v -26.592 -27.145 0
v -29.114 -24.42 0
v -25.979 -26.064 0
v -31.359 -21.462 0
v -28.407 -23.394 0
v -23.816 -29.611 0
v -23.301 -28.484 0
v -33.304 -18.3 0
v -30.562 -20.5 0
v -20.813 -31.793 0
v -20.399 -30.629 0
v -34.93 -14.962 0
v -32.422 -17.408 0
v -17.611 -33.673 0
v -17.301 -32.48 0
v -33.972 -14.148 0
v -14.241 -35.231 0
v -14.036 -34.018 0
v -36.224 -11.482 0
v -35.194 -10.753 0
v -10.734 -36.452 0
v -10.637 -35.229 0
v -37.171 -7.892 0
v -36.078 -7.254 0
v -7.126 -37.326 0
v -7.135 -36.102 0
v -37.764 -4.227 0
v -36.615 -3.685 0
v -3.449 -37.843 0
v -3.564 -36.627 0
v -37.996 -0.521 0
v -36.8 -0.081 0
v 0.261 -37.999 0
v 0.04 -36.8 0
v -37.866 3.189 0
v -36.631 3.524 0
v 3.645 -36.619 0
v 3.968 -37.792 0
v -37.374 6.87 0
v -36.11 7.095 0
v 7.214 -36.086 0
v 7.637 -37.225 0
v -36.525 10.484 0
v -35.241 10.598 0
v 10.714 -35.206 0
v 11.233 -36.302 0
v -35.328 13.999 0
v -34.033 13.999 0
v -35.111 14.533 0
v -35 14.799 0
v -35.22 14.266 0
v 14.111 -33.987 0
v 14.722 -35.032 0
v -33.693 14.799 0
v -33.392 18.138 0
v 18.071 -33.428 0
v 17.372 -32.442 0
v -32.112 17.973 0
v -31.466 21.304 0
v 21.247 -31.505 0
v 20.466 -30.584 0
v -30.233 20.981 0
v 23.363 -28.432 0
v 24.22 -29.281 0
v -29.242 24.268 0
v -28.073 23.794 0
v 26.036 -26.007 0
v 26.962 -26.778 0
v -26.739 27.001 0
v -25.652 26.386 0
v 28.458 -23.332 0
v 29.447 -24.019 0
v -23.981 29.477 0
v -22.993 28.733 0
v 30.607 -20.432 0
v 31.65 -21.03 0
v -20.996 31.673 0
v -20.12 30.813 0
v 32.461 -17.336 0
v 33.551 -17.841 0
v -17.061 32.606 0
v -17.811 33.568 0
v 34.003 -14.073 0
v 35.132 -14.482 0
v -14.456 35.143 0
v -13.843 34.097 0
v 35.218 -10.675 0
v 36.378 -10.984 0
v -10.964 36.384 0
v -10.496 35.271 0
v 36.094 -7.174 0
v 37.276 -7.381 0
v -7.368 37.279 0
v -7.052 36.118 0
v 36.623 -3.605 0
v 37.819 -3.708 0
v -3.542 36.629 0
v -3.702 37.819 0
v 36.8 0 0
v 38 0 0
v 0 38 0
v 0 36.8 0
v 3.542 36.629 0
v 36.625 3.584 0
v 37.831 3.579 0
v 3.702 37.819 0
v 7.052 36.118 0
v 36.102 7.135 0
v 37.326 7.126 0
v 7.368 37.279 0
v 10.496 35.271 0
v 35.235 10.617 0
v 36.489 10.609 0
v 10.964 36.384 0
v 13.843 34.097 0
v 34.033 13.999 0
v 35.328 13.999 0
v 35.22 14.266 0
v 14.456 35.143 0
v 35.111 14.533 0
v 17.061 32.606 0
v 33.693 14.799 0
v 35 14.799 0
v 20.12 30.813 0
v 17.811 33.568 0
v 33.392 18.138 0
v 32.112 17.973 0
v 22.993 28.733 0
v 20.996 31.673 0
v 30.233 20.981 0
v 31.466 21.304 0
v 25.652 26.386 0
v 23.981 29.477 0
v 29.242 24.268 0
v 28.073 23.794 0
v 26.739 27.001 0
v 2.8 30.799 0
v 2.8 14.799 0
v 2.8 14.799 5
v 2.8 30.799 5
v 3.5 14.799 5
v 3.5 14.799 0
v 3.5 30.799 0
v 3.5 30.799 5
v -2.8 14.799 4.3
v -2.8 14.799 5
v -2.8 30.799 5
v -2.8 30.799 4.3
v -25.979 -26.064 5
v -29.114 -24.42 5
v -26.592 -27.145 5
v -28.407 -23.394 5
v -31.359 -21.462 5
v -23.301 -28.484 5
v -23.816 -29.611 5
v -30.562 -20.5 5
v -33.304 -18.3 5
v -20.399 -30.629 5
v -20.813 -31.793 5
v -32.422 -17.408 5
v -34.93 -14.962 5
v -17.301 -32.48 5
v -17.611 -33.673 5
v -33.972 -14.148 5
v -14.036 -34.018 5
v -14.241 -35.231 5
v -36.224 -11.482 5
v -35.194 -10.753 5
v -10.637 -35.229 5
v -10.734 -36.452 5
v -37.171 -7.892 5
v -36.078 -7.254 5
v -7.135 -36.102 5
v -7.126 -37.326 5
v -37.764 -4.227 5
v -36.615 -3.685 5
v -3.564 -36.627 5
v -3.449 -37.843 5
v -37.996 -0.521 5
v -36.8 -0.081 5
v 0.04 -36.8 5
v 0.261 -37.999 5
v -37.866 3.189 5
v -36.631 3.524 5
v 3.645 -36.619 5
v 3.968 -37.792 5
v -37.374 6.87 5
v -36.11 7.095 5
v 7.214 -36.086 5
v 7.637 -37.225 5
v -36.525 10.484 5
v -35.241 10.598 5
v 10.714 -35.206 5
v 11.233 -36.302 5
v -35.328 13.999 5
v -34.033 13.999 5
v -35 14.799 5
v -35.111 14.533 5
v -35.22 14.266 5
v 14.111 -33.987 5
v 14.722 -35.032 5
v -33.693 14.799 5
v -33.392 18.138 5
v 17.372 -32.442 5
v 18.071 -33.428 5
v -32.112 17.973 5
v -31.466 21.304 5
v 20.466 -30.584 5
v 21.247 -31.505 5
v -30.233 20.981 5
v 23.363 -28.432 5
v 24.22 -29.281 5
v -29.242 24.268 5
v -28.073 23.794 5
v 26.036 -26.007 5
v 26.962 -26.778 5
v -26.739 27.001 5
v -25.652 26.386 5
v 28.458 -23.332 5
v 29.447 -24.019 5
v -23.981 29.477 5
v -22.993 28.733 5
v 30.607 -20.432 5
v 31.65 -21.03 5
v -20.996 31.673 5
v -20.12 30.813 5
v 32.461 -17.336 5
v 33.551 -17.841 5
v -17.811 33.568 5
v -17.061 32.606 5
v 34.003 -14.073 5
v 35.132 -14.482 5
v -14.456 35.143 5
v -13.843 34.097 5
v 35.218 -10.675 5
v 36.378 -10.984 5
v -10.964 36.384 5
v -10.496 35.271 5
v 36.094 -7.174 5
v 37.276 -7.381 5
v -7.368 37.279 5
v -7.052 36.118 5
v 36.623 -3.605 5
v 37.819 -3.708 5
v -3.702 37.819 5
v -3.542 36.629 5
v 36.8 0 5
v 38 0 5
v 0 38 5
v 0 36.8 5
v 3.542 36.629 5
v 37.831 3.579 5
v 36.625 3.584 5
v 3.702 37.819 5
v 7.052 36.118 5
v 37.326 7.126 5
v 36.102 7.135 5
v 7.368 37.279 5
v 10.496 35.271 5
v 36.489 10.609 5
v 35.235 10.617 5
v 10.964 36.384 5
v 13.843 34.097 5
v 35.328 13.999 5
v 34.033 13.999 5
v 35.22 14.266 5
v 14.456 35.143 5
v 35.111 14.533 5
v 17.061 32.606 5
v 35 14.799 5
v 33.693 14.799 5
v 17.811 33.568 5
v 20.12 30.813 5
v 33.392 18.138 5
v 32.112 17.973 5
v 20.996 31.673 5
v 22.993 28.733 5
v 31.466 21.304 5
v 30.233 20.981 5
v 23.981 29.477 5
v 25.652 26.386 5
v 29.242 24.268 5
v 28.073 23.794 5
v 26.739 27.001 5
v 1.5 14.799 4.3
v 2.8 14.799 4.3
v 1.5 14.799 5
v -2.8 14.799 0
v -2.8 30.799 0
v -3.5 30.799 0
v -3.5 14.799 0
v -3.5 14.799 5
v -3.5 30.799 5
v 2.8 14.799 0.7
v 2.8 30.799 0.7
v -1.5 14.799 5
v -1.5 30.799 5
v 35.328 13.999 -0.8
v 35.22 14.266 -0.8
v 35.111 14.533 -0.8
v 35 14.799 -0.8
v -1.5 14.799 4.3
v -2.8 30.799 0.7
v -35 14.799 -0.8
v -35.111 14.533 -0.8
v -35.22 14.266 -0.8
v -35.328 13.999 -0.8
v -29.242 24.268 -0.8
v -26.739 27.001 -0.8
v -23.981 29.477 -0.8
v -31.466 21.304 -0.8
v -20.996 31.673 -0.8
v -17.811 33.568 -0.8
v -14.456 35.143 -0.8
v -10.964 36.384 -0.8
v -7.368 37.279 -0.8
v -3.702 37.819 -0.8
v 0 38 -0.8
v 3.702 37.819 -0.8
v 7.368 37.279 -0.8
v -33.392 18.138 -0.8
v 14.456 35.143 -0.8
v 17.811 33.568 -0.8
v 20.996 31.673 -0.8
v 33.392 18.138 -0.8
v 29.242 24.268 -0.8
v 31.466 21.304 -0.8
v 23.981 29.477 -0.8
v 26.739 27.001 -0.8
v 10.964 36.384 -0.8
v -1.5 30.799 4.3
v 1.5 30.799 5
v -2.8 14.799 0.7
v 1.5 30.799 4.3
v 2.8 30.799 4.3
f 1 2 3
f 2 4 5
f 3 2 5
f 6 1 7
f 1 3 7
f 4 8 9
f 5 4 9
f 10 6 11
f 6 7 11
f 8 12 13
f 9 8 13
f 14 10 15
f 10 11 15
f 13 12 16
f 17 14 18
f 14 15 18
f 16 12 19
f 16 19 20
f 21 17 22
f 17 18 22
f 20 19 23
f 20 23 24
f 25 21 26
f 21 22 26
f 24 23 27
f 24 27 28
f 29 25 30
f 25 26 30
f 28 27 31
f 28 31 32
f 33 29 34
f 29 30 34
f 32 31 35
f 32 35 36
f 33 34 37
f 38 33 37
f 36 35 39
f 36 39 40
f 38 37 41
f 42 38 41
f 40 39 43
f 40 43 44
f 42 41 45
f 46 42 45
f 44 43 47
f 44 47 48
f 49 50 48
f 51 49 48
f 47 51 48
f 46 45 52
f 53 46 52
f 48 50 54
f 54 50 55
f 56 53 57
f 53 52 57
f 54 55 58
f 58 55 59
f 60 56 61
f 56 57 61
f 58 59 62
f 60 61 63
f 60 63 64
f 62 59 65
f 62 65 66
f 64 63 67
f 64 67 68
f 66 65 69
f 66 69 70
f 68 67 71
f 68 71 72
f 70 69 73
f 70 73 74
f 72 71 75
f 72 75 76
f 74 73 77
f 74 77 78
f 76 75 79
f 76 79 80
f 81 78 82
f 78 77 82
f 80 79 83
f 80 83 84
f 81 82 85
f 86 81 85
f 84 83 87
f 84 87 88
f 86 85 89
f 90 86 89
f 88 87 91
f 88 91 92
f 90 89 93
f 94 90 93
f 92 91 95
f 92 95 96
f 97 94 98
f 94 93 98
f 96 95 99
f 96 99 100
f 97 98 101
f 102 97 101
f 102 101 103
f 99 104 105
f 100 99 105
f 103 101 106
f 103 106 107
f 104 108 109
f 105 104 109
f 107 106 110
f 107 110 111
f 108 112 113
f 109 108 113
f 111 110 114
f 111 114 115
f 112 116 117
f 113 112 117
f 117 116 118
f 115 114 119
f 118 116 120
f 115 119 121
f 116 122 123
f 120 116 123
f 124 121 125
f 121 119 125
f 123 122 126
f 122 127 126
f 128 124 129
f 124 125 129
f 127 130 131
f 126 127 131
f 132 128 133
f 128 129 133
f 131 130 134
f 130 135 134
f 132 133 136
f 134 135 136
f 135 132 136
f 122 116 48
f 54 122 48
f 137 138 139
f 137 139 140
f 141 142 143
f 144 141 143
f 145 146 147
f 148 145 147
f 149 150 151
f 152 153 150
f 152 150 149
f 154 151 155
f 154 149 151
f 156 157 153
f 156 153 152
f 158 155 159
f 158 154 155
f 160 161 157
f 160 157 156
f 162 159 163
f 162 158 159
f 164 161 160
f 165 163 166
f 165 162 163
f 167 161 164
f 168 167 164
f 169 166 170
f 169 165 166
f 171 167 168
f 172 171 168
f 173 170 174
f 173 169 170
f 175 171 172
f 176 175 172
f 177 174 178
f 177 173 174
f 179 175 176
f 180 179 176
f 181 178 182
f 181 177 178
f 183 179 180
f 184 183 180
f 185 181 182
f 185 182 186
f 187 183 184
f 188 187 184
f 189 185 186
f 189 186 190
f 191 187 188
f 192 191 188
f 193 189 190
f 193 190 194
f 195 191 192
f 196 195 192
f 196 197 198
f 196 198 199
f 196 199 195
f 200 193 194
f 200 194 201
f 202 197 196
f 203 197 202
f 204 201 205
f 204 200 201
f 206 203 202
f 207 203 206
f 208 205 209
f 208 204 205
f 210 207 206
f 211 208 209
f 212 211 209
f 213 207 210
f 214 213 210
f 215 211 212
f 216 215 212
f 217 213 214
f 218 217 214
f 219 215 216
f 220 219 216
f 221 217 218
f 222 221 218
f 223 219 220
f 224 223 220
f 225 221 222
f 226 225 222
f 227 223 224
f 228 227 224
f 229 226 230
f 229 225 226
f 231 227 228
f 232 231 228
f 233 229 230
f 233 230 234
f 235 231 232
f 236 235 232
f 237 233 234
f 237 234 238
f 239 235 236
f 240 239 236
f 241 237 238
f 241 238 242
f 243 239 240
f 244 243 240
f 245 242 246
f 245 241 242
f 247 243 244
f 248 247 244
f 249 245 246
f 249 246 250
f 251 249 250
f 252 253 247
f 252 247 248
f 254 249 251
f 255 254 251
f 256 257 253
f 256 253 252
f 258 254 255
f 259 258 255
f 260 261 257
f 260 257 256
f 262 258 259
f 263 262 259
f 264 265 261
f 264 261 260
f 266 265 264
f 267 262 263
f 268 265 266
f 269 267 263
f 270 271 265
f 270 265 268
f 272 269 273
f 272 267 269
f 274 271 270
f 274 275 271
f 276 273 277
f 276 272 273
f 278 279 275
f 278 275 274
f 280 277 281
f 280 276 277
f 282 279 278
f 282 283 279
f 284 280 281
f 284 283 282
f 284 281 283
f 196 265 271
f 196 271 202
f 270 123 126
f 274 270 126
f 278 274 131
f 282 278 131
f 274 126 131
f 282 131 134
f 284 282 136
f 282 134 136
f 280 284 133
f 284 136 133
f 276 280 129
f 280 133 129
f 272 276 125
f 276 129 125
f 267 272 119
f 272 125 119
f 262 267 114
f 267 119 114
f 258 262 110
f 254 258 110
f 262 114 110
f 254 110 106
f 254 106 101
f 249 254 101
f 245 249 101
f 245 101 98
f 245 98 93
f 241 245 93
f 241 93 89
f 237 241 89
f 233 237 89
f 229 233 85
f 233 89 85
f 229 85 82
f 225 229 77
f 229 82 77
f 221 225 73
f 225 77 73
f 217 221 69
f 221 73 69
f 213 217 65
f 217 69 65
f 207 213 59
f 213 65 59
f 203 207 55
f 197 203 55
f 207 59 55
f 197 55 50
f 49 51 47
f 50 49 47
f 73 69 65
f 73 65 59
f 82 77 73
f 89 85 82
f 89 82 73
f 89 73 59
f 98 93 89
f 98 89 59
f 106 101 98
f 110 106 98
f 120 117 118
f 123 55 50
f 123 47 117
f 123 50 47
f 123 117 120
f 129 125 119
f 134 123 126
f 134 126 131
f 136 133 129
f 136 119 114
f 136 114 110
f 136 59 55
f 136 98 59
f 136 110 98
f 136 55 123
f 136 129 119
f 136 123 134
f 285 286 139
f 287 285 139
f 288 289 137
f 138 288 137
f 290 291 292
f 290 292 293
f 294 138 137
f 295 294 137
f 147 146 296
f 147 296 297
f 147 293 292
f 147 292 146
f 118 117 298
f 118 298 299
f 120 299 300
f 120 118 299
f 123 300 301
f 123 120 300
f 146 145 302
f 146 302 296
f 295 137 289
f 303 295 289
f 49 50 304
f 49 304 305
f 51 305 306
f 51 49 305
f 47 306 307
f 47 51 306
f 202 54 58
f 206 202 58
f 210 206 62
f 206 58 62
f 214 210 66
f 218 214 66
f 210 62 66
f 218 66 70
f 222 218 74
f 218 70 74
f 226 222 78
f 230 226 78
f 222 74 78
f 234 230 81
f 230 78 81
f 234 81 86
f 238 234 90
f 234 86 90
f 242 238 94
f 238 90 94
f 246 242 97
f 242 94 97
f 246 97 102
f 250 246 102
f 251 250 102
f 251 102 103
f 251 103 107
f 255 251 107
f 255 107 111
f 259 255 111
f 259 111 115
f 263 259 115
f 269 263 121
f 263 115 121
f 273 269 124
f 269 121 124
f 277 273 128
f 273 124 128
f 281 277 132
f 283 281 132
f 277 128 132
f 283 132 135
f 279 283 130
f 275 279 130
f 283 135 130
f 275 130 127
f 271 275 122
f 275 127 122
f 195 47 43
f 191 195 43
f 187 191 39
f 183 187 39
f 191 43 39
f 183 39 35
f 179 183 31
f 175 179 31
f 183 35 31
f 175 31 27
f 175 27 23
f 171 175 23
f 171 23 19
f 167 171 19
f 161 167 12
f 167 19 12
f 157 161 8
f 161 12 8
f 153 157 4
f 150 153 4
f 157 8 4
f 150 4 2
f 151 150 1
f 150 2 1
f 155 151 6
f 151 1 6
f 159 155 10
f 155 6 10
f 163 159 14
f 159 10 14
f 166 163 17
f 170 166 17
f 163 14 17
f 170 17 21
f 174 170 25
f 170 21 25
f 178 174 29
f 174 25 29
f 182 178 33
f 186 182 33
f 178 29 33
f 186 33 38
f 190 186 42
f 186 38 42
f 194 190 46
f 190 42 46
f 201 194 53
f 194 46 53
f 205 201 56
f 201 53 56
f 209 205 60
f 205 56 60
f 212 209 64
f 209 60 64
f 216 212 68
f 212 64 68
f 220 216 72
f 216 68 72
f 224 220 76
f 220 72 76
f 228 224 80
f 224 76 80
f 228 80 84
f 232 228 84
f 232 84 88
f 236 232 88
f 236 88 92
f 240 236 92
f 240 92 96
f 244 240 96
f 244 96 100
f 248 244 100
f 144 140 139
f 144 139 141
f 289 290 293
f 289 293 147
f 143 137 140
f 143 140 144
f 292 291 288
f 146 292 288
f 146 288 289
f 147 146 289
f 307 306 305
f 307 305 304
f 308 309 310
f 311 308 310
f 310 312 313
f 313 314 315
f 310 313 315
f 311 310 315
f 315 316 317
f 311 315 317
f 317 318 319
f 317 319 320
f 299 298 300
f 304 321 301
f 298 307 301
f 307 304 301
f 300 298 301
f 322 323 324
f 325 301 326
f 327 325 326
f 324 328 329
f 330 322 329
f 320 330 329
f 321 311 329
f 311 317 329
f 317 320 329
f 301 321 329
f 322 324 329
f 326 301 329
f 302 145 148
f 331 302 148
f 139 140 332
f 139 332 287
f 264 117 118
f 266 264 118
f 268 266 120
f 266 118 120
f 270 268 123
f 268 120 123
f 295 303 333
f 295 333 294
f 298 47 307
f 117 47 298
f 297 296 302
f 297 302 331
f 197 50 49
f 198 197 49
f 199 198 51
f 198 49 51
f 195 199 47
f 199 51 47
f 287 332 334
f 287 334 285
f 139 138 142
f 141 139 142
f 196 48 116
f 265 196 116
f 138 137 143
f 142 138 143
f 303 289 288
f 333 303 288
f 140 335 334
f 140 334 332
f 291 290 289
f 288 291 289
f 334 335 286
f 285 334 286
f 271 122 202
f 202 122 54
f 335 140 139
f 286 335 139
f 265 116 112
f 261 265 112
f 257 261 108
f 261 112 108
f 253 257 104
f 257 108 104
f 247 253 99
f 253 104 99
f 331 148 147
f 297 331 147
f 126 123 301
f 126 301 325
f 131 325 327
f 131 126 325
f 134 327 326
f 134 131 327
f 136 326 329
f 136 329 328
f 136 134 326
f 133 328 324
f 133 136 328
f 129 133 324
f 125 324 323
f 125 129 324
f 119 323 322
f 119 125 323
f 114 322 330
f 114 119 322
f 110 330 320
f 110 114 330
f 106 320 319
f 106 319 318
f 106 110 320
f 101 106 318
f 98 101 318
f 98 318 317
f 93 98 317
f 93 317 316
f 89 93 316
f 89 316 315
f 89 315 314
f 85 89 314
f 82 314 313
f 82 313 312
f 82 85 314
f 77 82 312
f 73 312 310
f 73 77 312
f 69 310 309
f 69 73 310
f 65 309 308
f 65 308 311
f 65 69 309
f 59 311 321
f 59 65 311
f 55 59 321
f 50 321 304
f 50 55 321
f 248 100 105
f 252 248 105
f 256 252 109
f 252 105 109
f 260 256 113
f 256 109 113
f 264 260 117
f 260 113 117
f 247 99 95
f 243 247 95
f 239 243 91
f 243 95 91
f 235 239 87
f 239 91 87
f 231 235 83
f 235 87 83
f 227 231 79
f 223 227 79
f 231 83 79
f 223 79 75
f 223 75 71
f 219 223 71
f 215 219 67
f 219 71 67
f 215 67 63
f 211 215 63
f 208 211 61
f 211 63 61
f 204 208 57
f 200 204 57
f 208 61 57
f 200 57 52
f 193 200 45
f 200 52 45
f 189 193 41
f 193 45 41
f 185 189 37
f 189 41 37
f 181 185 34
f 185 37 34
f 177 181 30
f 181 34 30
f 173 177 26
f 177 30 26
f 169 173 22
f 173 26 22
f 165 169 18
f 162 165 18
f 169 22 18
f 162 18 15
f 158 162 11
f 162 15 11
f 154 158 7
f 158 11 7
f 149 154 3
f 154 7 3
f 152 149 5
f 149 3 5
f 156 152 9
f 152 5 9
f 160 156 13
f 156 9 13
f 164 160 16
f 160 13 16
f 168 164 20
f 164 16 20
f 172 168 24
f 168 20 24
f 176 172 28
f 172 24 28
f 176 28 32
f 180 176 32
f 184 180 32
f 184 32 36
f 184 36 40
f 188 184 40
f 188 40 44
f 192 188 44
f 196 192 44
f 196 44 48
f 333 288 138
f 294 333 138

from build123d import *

# Parameters (mm, degrees)
F1_DEPTH = 5
F0_W     = 0.7
F0_H     = 16
F2_DEPTH = 0.8
F3_DEPTH = 0.7
F4_DEPTH = 5
F5_W     = 16
F5_H     = 0.7
F7_DEPTH = 1.3
F6_W     = 16
F6_H     = 0.7
F8_DEPTH = 1.3


with BuildPart() as f1:
    # F0 (on Top) → F1 (new body)
    with BuildSketch(Plane.XY):
        with BuildLine():
            ThreePointArc((33.6933227806, 14.7986485869), (33.8657643047, 14.3996530533), (34.0334811287, 13.9986485869))
            Line((34.0334811287, 13.9986485869), (34.608, 13.9986485869))
            Line((34.608, 13.9986485869), (35.3275789963, 13.9986485869))
            ThreePointArc((35.3275789963, 13.9986485869), (35.1660644922, 14.3995801373), (35, 14.7986485869))
            Line((35, 14.7986485869), (33.6933227806, 14.7986485869))
        make_face()
        with BuildLine():
            ThreePointArc((-33.6933227806, 14.7986485869), (0, 36.8), (33.6933227806, 14.7986485869))
            Line((33.6933227806, 14.7986485869), (35, 14.7986485869))
            ThreePointArc((35, 14.7986485869), (0, 38), (-35, 14.7986485869))
            Line((-35, 14.7986485869), (-33.6933227806, 14.7986485869))
        make_face()
        with BuildLine():
            Line((-34.608, 13.9986485869), (-34.0334811287, 13.9986485869))
            ThreePointArc((-34.0334811287, 13.9986485869), (-33.8657643047, 14.3996530533), (-33.6933227806, 14.7986485869))
            Line((-33.6933227806, 14.7986485869), (-35, 14.7986485869))
            ThreePointArc((-35, 14.7986485869), (-35.1660644922, 14.3995801373), (-35.3275789963, 13.9986485869))
            Line((-35.3275789963, 13.9986485869), (-34.608, 13.9986485869))
        make_face()
        with BuildLine():
            ThreePointArc((34.0334811287, 13.9986485869), (36.101745841, 7.1347002202), (36.8, 0))
            ThreePointArc((36.8, 0), (-7.1347002202, -36.101745841), (-34.0334811287, 13.9986485869))
            Line((-34.0334811287, 13.9986485869), (-34.608, 13.9986485869))
            Line((-34.608, 13.9986485869), (-35.3275789963, 13.9986485869))
            ThreePointArc((-35.3275789963, 13.9986485869), (-7.1257279678, -37.3259159423), (38, 0))
            ThreePointArc((38, 0), (37.3259159423, 7.1257279678), (35.3275789963, 13.9986485869))
            Line((35.3275789963, 13.9986485869), (34.608, 13.9986485869))
            Line((34.608, 13.9986485869), (34.0334811287, 13.9986485869))
        make_face()
        with BuildLine():
            Line((-34.0334811287, 13.9986485869), (34.0334811287, 13.9986485869))
            ThreePointArc((34.0334811287, 13.9986485869), (33.8657643047, 14.3996530533), (33.6933227806, 14.7986485869))
            Line((33.6933227806, 14.7986485869), (3.5, 14.7986485869))
            Line((3.5, 14.7986485869), (2.8, 14.7986485869))
            Line((2.8, 14.7986485869), (0, 14.7986485869))
            Line((0, 14.7986485869), (-2.8, 14.7986485869))
            Line((-2.8, 14.7986485869), (-3.5, 14.7986485869))
            Line((-3.5, 14.7986485869), (-33.6933227806, 14.7986485869))
            ThreePointArc((-33.6933227806, 14.7986485869), (-33.8657643047, 14.3996530533), (-34.0334811287, 13.9986485869))
        make_face()
    extrude(amount=F1_DEPTH)


with BuildPart() as f2:
    # F0 (on Top) → F2 (new body)
    with BuildSketch(Plane.XY):
        with BuildLine():
            Line((3.5, 14.7986485869), (33.6933227806, 14.7986485869))
            ThreePointArc((33.6933227806, 14.7986485869), (0, 36.8), (-33.6933227806, 14.7986485869))
            Line((-33.6933227806, 14.7986485869), (-3.5, 14.7986485869))
            Line((-3.5, 14.7986485869), (-3.5, 30.7986485869))
            Line((-3.5, 30.7986485869), (-2.8, 30.7986485869))
            Line((-2.8, 30.7986485869), (2.8, 30.7986485869))
            Line((2.8, 30.7986485869), (3.5, 30.7986485869))
            Line((3.5, 30.7986485869), (3.5, 14.7986485869))
        make_face()
        with BuildLine():
            ThreePointArc((-33.6933227806, 14.7986485869), (0, 36.8), (33.6933227806, 14.7986485869))
            Line((33.6933227806, 14.7986485869), (35, 14.7986485869))
            ThreePointArc((35, 14.7986485869), (0, 38), (-35, 14.7986485869))
            Line((-35, 14.7986485869), (-33.6933227806, 14.7986485869))
        make_face()
        with BuildLine():
            Line((-34.0334811287, 13.9986485869), (34.0334811287, 13.9986485869))
            ThreePointArc((34.0334811287, 13.9986485869), (33.8657643047, 14.3996530533), (33.6933227806, 14.7986485869))
            Line((33.6933227806, 14.7986485869), (3.5, 14.7986485869))
            Line((3.5, 14.7986485869), (2.8, 14.7986485869))
            Line((2.8, 14.7986485869), (0, 14.7986485869))
            Line((0, 14.7986485869), (-2.8, 14.7986485869))
            Line((-2.8, 14.7986485869), (-3.5, 14.7986485869))
            Line((-3.5, 14.7986485869), (-33.6933227806, 14.7986485869))
            ThreePointArc((-33.6933227806, 14.7986485869), (-33.8657643047, 14.3996530533), (-34.0334811287, 13.9986485869))
        make_face()
        Polygon((0, 14.7986485869), (2.8, 14.7986485869), (2.8, 30.7986485869), (-2.8, 30.7986485869), (-2.8, 14.7986485869), align=None)
        with Locations((3.15, 22.7986485869)):
            Rectangle(F0_W, F0_H)
        with Locations((-3.15, 22.7986485869)):
            Rectangle(F0_W, F0_H)
        with BuildLine():
            ThreePointArc((33.6933227806, 14.7986485869), (33.8657643047, 14.3996530533), (34.0334811287, 13.9986485869))
            Line((34.0334811287, 13.9986485869), (34.608, 13.9986485869))
            Line((34.608, 13.9986485869), (35.3275789963, 13.9986485869))
            ThreePointArc((35.3275789963, 13.9986485869), (35.1660644922, 14.3995801373), (35, 14.7986485869))
            Line((35, 14.7986485869), (33.6933227806, 14.7986485869))
        make_face()
        with BuildLine():
            Line((-34.608, 13.9986485869), (-34.0334811287, 13.9986485869))
            ThreePointArc((-34.0334811287, 13.9986485869), (-33.8657643047, 14.3996530533), (-33.6933227806, 14.7986485869))
            Line((-33.6933227806, 14.7986485869), (-35, 14.7986485869))
            ThreePointArc((-35, 14.7986485869), (-35.1660644922, 14.3995801373), (-35.3275789963, 13.9986485869))
            Line((-35.3275789963, 13.9986485869), (-34.608, 13.9986485869))
        make_face()
    extrude(amount=-F2_DEPTH)


with BuildPart() as f3:
    # F0 (on Top) → F3 (new body)
    with BuildSketch(Plane.XY):
        Polygon((0, 14.7986485869), (2.8, 14.7986485869), (2.8, 30.7986485869), (-2.8, 30.7986485869), (-2.8, 14.7986485869), align=None)
    extrude(amount=F3_DEPTH)


with BuildPart() as f4:
    # F0 (on Top) → F4 (new body)
    with BuildSketch(Plane.XY):
        with Locations((-3.15, 22.7986485869)):
            Rectangle(F0_W, F0_H)
    extrude(amount=F4_DEPTH)


with BuildPart() as f4b:
    # F0 (on Top) → F4, piece 2 (new body)
    with BuildSketch(Plane.XY):
        with Locations((3.15, 22.7986485869)):
            Rectangle(F0_W, F0_H)
    extrude(amount=F4_DEPTH)


with BuildPart() as f7:
    # F5 (on face) → F7 (new body)
    with BuildSketch(Plane(origin=(2.8, 0, 0), x_dir=(0, -1, 0), z_dir=(-1, 0, 0))):
        with Locations((-22.7986485869, 4.65)):
            Rectangle(F5_W, F5_H)
    extrude(amount=F7_DEPTH)


with BuildPart() as f8:
    # F6 (on face) → F8 (new body)
    with BuildSketch(Plane.YZ.offset(-2.8)):
        with Locations((22.7986485869, 4.65)):
            Rectangle(F6_W, F6_H)
    extrude(amount=F8_DEPTH)


solid = Compound([f1.part, f2.part, f3.part, f4.part, f4b.part, f7.part, f8.part])
